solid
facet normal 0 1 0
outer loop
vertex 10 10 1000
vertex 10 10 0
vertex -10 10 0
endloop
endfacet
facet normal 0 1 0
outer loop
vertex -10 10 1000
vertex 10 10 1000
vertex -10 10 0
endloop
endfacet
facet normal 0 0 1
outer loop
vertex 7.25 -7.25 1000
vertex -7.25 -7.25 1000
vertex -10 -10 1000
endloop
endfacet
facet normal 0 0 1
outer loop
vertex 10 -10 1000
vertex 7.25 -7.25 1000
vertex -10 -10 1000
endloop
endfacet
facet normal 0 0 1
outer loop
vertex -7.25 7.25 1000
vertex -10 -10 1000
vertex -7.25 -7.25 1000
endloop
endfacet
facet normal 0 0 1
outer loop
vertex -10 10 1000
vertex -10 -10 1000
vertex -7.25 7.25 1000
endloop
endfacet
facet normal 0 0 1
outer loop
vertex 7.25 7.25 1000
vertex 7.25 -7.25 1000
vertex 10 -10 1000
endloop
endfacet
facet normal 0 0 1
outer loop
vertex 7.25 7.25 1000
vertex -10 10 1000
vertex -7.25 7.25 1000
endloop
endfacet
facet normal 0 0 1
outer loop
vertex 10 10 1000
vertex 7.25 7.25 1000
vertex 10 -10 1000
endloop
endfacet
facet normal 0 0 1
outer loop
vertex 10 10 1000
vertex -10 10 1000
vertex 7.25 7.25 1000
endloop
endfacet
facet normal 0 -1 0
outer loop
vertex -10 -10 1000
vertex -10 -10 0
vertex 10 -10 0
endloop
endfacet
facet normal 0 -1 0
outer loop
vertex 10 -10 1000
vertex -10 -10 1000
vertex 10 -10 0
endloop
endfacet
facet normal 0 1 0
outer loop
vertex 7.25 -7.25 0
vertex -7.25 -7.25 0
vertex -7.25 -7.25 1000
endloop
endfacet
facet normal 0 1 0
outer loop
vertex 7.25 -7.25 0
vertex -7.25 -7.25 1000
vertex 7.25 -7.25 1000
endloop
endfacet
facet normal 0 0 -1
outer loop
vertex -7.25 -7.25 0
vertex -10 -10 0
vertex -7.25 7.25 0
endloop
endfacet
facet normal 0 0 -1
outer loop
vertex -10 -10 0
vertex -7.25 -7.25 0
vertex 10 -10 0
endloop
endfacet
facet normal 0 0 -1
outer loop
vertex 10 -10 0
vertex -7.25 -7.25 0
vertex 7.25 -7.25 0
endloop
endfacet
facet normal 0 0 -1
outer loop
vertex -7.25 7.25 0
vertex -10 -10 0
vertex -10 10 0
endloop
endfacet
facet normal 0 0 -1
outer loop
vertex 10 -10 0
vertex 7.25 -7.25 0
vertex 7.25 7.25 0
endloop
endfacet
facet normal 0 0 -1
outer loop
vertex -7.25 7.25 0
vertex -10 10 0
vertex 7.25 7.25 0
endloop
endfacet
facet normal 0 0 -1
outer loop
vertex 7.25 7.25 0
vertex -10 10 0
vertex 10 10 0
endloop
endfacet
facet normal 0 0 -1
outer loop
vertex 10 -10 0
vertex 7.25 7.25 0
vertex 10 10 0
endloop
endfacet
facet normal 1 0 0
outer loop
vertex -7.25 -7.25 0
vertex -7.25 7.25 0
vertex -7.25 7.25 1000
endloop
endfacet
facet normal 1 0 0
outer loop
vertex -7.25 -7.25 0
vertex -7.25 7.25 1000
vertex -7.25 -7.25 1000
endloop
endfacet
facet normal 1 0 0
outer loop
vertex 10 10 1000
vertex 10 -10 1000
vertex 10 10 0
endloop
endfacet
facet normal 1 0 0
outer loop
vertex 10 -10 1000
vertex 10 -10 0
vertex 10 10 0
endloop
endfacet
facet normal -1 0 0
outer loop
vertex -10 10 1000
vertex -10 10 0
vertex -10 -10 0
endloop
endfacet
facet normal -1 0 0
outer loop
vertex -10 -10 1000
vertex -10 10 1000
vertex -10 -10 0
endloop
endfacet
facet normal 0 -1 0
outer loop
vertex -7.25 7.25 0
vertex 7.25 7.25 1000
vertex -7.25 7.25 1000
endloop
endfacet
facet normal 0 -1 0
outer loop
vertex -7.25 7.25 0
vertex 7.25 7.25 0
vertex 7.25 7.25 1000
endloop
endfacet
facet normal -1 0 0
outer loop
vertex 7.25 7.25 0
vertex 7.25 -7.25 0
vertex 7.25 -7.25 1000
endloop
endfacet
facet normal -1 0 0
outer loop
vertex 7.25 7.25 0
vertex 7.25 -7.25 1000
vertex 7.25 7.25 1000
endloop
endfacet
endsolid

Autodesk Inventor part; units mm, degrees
ref_plane "YZ Plane" through (0, 0, 0) normal (1, 0, 0) x (0, 1, 0)
ref_plane "XZ Plane" through (0, 0, 0) normal (0, 1, 0) x (-1, 0, 0)
ref_plane "XY Plane" through (0, 0, 0) normal (0, 0, 1) x (1, 0, 0)
sketch "Sketch1" plane through (0, 0, 0) normal (0, 0, 1) x (1, 0, 0)
  line L0 (-10, -10) -> (10, -10)
  line L1 (10, -10) -> (10, 10)
  line L2 (10, 10) -> (-10, 10)
  line L3 (-10, 10) -> (-10, -10)
  line L4 (-10, -10) -> (10, 10) construction
  line L5 (10, -10) -> (-10, 10) construction
  line L6 (-7.25, -7.25) -> (7.25, -7.25)
  line L7 (7.25, -7.25) -> (7.25, 7.25)
  line L8 (7.25, 7.25) -> (-7.25, 7.25)
  line L9 (-7.25, 7.25) -> (-7.25, -7.25)
  line L10 (-7.25, -7.25) -> (7.25, 7.25) construction
  line L11 (7.25, -7.25) -> (-7.25, 7.25) construction
  point P0 (0, 0)
  dimension "d0" = 20
  dimension "d1" = 20
  dimension "d2" = 14.5
  dimension "d3" = 14.5
extrude "Extrusion1" add sketch "Sketch1" along normal blind 1000
equation "\"d3\" = d2"
properties part number "aluprofile_1m" material "Aluminum 6061"
